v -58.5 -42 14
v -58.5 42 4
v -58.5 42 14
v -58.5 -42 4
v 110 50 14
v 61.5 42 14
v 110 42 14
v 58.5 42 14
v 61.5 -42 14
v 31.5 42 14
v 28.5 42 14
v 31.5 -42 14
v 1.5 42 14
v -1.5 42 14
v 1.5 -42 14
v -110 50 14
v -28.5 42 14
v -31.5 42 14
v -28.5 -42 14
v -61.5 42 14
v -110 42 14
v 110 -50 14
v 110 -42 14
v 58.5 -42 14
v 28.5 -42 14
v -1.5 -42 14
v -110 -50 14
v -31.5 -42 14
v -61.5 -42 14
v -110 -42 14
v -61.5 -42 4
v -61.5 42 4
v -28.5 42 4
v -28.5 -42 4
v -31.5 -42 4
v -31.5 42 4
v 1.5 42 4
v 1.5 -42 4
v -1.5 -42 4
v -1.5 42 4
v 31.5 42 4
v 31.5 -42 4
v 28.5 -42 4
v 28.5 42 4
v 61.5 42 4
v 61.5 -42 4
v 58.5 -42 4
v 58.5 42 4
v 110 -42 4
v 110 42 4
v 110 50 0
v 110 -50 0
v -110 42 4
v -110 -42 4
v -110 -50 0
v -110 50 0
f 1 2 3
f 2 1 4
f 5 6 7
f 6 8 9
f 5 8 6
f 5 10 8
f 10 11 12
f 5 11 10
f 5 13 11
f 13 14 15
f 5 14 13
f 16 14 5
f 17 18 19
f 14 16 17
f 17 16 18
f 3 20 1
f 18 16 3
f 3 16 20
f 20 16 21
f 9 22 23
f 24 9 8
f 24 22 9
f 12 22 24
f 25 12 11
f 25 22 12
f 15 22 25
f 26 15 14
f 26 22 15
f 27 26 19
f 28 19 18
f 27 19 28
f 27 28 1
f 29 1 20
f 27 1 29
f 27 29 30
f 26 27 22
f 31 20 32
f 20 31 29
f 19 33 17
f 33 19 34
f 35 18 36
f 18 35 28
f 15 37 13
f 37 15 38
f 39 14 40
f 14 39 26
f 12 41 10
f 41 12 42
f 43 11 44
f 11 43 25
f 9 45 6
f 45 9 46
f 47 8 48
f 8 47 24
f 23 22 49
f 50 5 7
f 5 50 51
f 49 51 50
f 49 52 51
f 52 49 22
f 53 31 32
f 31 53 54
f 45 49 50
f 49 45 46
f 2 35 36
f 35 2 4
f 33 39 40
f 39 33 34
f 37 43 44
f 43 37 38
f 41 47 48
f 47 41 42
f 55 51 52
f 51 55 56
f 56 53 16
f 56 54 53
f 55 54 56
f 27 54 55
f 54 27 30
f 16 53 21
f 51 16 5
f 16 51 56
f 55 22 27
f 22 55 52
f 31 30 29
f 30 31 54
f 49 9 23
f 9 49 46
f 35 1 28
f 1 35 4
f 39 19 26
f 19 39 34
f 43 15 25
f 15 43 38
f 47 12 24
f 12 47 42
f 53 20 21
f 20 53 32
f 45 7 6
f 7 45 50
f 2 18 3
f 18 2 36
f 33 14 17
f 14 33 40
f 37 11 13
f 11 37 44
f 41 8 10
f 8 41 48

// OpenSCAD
$fn = 32;

// ----------------------------------------------------------------------
// Rib frame 220 x 100 x 14
// 5 ribs at 30 mm pitch
// ----------------------------------------------------------------------

// --- parameters (mm) ---
frame = [220, 100, 4];  // base plate size (x, y, z)
rail_w = 8;             // side rail width
ribs = 5;               // number of ribs
rib_t = 3;              // rib thickness
rib_h = 10;             // rib height above the base plate
pitch = 30;             // pitch between rib centres

// --- derived feature positions (mm) ---
span = (ribs - 1) * pitch;          // = 120   distance between the outer ribs
origin_x = -span / 2;               // = -60   X of the first rib
rib_len = frame[1] - 2 * rail_w + 2;  // = 86   rib length, 1 mm into each rail
feature_centers = [
  [origin_x + 0 * pitch, 0],
  [origin_x + 1 * pitch, 0],
  [origin_x + 2 * pitch, 0],
  [origin_x + 3 * pitch, 0],
  [origin_x + 4 * pitch, 0]
];   // rib centre line, drives the rib loop

// base plate, two side rails, then the ribs read straight off feature_centers
union() {
  translate([-frame[0] / 2, -frame[1] / 2, 0]) cube(frame);
  translate([-frame[0] / 2, -frame[1] / 2, 0]) cube([frame[0], rail_w, frame[2] + rib_h]);
  translate([-frame[0] / 2, frame[1] / 2 - rail_w, 0]) cube([frame[0], rail_w, frame[2] + rib_h]);
  for (centre = feature_centers)
    translate([centre[0] - rib_t / 2, centre[1] - rib_len / 2, frame[2] - 1])
      cube([rib_t, rib_len, rib_h + 1]);
}
